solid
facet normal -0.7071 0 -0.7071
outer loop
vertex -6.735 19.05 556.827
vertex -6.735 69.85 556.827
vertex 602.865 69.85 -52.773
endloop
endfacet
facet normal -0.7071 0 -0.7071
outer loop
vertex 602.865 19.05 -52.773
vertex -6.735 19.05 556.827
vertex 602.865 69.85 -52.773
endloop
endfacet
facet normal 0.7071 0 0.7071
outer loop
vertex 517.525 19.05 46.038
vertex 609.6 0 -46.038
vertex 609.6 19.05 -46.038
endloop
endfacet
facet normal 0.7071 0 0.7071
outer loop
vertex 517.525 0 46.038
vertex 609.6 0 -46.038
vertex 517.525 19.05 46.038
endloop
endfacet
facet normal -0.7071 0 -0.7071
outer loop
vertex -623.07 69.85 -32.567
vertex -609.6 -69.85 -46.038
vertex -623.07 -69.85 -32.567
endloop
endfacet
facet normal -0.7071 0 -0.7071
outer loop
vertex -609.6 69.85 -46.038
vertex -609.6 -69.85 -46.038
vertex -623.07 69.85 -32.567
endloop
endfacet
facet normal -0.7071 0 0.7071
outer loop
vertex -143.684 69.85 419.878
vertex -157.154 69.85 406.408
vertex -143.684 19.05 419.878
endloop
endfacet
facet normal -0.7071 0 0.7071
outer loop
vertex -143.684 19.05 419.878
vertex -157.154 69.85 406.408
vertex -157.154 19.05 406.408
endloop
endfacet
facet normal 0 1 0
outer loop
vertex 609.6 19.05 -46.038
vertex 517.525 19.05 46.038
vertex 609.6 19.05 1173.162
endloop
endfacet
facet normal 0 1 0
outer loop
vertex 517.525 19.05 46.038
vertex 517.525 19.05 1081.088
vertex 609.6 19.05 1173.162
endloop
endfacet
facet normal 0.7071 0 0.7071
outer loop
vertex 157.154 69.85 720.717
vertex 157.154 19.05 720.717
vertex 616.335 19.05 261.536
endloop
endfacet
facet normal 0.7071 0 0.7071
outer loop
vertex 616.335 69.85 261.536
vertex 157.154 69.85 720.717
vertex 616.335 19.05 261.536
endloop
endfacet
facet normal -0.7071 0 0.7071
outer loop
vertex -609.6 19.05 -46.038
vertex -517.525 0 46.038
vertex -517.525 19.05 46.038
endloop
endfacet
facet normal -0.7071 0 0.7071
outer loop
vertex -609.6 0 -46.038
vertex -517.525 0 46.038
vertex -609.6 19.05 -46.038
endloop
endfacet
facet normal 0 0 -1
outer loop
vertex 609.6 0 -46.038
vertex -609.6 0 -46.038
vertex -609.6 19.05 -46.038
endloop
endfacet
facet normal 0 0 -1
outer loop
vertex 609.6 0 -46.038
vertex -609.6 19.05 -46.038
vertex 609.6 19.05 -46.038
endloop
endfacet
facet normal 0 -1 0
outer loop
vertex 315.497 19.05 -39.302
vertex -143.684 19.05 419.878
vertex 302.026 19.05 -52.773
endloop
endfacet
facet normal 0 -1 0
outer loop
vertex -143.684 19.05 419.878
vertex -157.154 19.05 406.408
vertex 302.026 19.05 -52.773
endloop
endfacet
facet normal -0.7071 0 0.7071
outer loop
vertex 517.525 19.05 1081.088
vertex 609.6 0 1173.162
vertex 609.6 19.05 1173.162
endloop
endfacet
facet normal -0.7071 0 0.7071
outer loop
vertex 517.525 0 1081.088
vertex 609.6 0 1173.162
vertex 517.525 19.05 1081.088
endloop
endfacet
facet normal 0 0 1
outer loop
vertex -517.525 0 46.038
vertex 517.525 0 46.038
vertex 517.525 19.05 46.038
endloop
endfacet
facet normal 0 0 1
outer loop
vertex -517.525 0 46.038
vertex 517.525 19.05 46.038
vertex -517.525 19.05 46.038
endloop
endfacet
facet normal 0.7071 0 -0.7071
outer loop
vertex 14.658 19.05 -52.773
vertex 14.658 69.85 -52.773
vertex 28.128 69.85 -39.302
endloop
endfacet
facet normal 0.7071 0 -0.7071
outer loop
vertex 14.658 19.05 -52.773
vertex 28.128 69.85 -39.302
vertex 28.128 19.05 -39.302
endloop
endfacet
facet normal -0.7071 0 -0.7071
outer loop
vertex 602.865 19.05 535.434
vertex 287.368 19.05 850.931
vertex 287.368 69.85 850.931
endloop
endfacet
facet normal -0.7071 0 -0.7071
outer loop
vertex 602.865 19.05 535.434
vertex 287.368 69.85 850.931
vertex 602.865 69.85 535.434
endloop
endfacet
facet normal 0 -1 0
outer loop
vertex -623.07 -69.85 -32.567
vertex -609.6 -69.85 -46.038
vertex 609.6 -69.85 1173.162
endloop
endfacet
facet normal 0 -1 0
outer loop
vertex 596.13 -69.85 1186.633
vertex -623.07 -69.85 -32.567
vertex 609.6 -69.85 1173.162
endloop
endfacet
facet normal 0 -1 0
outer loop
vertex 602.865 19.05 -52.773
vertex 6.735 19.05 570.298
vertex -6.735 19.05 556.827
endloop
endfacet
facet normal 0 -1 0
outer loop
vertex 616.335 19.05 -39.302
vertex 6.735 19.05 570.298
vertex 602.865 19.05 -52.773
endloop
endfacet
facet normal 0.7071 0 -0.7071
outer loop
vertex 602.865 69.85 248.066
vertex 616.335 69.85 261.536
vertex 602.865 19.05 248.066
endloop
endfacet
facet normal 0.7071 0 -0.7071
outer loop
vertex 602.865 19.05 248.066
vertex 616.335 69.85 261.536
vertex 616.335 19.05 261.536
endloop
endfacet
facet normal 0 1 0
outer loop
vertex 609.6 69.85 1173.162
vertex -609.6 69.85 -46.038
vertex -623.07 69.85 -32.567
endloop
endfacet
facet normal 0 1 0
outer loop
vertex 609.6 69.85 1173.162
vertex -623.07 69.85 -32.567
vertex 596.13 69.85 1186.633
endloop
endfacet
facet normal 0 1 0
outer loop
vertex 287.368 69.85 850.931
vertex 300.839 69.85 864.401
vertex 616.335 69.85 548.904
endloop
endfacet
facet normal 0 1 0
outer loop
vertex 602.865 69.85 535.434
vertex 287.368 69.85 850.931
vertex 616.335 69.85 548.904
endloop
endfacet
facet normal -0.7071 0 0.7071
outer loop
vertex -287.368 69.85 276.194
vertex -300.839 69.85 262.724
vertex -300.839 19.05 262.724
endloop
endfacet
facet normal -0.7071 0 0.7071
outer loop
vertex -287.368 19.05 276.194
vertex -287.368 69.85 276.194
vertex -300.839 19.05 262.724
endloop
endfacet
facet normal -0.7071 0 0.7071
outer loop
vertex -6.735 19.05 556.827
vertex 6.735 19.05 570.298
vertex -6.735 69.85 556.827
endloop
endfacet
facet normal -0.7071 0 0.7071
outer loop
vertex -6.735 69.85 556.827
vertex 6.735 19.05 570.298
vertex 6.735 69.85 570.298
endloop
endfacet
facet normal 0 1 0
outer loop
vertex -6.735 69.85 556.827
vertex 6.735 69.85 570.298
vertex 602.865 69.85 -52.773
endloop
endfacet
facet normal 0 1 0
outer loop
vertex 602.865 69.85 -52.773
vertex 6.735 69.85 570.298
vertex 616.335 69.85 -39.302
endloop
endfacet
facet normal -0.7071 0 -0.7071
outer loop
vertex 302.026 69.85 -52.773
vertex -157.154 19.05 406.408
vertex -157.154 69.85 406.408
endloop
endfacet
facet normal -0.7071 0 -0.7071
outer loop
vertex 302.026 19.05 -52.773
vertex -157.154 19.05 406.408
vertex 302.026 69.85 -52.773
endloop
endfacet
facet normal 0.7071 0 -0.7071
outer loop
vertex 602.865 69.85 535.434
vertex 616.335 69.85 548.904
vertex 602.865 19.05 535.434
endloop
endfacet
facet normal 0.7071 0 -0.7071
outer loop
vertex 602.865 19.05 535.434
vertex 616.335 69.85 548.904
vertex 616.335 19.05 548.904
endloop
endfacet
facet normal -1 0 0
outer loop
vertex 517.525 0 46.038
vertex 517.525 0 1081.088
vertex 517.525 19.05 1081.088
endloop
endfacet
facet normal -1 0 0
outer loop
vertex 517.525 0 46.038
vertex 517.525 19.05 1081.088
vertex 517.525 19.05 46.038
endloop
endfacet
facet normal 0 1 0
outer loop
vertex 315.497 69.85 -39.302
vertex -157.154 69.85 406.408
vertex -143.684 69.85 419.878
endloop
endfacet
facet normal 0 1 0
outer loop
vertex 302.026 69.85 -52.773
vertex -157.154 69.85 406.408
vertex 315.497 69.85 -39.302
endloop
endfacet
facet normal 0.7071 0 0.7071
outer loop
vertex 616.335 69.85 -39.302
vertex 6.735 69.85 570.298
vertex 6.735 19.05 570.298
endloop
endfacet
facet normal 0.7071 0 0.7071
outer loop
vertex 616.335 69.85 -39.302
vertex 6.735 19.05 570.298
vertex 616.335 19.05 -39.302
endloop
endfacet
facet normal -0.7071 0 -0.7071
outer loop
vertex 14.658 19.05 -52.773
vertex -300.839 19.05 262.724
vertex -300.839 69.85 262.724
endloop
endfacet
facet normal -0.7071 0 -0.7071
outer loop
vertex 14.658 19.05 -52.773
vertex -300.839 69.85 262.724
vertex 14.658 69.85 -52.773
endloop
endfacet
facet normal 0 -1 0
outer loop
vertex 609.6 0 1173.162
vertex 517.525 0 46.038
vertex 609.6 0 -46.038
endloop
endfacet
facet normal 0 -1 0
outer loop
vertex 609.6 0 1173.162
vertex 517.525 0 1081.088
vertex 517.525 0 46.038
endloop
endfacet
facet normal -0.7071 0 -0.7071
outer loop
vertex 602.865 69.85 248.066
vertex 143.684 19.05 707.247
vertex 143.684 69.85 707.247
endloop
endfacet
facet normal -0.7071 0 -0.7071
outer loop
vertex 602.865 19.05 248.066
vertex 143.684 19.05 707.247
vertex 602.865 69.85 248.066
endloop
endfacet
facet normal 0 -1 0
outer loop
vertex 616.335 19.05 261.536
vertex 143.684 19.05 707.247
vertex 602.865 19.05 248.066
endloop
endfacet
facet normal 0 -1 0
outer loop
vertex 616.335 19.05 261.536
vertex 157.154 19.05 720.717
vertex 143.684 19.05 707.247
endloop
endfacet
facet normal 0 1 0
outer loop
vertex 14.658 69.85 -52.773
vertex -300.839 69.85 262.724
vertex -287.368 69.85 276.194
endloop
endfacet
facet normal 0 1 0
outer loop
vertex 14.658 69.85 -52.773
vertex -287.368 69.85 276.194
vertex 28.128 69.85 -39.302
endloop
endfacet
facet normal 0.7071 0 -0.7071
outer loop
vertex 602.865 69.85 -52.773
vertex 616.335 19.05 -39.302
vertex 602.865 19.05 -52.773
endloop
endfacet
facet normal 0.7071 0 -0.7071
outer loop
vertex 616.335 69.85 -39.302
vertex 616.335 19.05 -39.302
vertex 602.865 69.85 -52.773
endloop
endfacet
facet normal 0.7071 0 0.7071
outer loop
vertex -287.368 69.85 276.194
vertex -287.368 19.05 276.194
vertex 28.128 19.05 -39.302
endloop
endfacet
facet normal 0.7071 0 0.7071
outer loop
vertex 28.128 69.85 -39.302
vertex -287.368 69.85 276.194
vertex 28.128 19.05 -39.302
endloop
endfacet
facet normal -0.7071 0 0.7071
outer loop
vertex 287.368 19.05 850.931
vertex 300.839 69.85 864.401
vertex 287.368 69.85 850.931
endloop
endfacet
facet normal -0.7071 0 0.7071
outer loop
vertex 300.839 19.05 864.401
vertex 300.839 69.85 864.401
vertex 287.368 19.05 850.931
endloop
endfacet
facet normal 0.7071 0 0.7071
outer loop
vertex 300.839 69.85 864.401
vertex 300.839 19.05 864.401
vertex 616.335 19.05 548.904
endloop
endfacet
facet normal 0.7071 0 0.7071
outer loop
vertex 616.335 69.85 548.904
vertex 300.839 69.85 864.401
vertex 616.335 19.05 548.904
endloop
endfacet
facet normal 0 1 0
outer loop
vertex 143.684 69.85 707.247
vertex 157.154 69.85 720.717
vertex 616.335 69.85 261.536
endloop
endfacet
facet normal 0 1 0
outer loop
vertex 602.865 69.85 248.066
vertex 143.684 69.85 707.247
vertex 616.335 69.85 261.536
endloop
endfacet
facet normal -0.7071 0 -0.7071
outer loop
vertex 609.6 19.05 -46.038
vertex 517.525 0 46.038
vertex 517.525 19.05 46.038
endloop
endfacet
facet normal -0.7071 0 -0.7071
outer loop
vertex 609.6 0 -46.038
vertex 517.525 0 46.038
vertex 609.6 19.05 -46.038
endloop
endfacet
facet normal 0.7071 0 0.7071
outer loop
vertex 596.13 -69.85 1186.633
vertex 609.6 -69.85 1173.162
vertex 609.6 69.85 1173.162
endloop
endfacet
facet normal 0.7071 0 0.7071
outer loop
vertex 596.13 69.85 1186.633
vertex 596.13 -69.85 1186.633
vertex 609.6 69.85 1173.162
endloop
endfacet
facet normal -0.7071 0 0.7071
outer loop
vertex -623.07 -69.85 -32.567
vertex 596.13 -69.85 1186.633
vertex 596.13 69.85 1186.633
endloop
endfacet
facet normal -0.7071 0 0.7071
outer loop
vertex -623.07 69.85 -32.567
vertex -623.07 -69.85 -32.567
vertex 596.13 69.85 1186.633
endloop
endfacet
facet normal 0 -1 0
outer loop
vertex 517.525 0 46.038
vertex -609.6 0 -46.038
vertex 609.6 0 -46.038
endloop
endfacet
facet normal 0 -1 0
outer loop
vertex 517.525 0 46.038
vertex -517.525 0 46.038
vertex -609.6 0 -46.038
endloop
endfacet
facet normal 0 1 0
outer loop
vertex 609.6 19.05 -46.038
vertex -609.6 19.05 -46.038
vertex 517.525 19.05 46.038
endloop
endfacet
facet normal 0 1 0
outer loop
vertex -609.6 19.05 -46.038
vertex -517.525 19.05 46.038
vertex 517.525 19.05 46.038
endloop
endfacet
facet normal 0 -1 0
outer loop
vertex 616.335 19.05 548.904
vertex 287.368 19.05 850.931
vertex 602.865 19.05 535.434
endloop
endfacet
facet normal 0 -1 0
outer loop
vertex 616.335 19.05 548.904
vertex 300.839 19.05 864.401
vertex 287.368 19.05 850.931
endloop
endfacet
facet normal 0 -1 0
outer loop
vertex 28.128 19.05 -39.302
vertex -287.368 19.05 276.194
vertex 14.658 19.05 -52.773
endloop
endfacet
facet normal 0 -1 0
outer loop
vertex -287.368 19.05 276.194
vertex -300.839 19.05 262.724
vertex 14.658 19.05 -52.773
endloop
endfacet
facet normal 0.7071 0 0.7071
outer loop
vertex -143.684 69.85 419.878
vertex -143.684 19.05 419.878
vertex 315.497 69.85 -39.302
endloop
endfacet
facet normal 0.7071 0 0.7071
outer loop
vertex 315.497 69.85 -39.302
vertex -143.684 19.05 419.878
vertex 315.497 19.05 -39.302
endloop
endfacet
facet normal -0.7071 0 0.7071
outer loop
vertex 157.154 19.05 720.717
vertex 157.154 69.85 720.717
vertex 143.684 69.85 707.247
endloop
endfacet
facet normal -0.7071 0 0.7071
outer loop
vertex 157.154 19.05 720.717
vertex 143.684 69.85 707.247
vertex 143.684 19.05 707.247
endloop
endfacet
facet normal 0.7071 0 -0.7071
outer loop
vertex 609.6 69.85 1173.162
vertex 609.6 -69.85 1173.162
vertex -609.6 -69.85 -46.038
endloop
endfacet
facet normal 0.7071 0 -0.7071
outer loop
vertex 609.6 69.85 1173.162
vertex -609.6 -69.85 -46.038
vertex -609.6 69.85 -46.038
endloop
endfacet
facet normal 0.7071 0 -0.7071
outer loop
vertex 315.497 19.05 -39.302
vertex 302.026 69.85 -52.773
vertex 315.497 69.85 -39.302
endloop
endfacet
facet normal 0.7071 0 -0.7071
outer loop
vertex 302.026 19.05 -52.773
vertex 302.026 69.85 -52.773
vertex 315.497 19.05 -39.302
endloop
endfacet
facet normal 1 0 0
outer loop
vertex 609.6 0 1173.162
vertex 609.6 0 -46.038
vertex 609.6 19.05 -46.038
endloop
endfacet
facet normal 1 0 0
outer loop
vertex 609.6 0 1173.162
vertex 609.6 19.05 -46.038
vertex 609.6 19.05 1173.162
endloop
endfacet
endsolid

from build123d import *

# Parameters (mm, degrees)
F1_DEPTH  = 19.05
F3_DEPTH  = 19.05
F5_W      = 139.7
F5_H      = 1724.2091752453
F6_DEPTH  = 19.05
F8_W      = 862.1045876226
F8_H      = 50.8
F9_DEPTH  = 9.525
F11_W     = 649.3795876226
F11_H     = 50.8
F12_DEPTH = 9.525
F14_W     = 446.1795876226
F14_H     = 50.8
F15_DEPTH = 9.525


with BuildPart() as f1:
    # F0 (on Front) → F1 (new body)
    with BuildSketch(Plane.XZ):
        Polygon((-609.6, -46.0375), (609.6, -46.0375), (517.525, 46.0375), (-517.525, 46.0375), align=None)
    extrude(amount=-F1_DEPTH)


with BuildPart() as f3:
    # F2 (on Front) → F3 (new body)
    with BuildSketch(Plane.XZ):
        Polygon((517.525, 46.0375), (609.6, -46.0375), (609.6, 1173.1625), (517.525, 1081.0875), align=None)
    extrude(amount=-F3_DEPTH)


with BuildPart() as f6:
    # F5 (on 3pt) → F6 (new body)
    with BuildSketch(Plane(origin=(-281.78125, 0, 281.78125), x_dir=(0, 1, 0), z_dir=(0.7071067812, 0, -0.7071067812))):
        with Locations((0, 398.4988653724)):
            Rectangle(F5_W, F5_H)
    extrude(amount=-F6_DEPTH)


with BuildPart() as f9:
    # F8 (on offset) → F9 (new body, symmetric)
    with BuildSketch(Plane(origin=(281.78125, 0, 281.78125), x_dir=(0.7071067812, 0, -0.7071067812), z_dir=(0.7071067812, 0, 0.7071067812))):
        with Locations((32.5534284389, 44.45)):
            Rectangle(F8_W, F8_H)
    extrude(amount=F9_DEPTH, both=True)


with BuildPart() as f12:
    # F11 (on offset) → F12 (new body, symmetric)
    with BuildSketch(Plane(origin=(131.3619599721, 0, 131.3619599721), x_dir=(0.7071067812, 0, -0.7071067812), z_dir=(-0.7071067812, 0, -0.7071067812))):
        with Locations((-73.8090715611, -44.45)):
            Rectangle(F11_W, F11_H)
    extrude(amount=F12_DEPTH, both=True)


with BuildPart() as f15:
    # F14 (on offset) → F15 (new body, symmetric)
    with BuildSketch(Plane(origin=(-12.322137965, 0, -12.322137965), x_dir=(0.7071067812, 0, -0.7071067812), z_dir=(-0.7071067812, 0, -0.7071067812))):
        with Locations((-175.4090715611, -44.45)):
            Rectangle(F14_W, F14_H)
    extrude(amount=F15_DEPTH, both=True)


with BuildPart() as f16_1:
    # F16: instance of F15
    add(f15.part.mirror(Plane(origin=(563.5625, 9.525, 0), x_dir=(0, 1, 0), z_dir=(0.7071067812, 0, 0.7071067812))))


with BuildPart() as f16_2:
    # F16: instance of F12
    add(f12.part.mirror(Plane(origin=(563.5625, 9.525, 0), x_dir=(0, 1, 0), z_dir=(0.7071067812, 0, 0.7071067812))))


solid = Compound([f1.part, f3.part, f6.part, f9.part, f12.part, f15.part, f16_1.part, f16_2.part])
